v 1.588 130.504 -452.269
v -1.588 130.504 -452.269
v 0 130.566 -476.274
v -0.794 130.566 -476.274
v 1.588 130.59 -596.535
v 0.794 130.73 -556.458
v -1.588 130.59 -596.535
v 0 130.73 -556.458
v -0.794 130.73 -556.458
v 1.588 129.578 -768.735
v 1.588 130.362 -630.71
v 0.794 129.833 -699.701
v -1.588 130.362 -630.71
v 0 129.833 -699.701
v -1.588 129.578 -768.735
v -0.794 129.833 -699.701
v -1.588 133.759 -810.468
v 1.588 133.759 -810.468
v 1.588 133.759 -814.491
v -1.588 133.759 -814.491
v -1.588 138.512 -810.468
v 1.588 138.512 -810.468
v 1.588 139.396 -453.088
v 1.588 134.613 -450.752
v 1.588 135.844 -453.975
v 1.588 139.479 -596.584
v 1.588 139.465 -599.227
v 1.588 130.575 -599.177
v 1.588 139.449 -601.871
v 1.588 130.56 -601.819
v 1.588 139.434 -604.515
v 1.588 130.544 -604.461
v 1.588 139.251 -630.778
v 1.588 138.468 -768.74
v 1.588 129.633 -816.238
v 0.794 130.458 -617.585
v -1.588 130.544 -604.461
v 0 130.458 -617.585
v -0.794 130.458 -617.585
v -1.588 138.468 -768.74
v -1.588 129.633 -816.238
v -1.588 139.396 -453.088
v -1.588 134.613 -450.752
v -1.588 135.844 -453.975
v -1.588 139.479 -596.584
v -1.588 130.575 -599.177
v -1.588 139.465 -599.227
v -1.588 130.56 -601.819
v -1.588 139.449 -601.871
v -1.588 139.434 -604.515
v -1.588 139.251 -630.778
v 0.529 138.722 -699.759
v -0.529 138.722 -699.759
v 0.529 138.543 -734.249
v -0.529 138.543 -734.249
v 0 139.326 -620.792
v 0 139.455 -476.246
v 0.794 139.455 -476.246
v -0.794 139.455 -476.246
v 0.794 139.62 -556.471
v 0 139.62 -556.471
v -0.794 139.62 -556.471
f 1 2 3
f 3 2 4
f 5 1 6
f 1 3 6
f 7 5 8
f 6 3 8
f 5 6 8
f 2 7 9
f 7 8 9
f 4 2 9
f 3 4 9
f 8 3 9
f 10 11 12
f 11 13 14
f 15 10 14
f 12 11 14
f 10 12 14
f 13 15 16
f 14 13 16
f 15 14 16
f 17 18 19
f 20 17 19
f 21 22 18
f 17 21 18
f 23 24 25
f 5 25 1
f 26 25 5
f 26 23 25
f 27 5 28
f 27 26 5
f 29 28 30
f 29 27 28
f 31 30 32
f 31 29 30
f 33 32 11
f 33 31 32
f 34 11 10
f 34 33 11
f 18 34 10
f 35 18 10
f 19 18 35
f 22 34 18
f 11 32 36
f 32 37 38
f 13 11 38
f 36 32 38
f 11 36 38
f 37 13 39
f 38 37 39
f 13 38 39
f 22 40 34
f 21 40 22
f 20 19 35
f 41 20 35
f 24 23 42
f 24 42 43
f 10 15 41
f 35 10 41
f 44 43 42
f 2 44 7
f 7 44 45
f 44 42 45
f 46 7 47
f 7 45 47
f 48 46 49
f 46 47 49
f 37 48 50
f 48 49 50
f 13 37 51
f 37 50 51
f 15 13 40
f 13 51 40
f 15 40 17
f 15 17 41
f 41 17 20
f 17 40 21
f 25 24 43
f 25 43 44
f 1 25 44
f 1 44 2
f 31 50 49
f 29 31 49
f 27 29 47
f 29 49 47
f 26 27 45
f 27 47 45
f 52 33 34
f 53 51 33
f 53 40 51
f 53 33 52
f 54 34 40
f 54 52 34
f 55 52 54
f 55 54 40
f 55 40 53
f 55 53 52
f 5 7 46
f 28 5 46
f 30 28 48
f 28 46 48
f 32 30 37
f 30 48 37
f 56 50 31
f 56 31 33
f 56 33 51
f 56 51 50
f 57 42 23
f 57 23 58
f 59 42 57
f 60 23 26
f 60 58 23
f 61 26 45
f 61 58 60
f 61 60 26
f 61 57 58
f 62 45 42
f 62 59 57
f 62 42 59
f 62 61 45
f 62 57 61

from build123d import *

# Parameters (mm, degrees)
BOSS_EXTRUDE1_START = -1.5875
BOSS_EXTRUDE1_DEPTH = 3.175
FILLET1_R           = 2.54
CUT_EXTRUDE1_DEPTH  = 2674.191025632
FILLET2_R           = 0.762
FILLET3_R           = 0.762
CUT_EXTRUDE2_DEPTH  = 7.62


with BuildPart() as part:
    # Boss-Extrude1: read off the stored shape, not the designer's step
    # Boss-Extrude1 outline → Boss-Extrude1 (new body)
    with BuildSketch(Plane(origin=(0, 0, 0), x_dir=(0, 0, -1), z_dir=(1, 0, 0)).offset(BOSS_EXTRUDE1_START)):
        with BuildLine():
            add(Edge.make_bspline(
                [(1110.404970926, 130.384545774), (1120.170834465, 130.370061323), (1139.703057908, 130.338772026), (1168.998370974, 130.277673039), (1198.290610395, 130.194386876), (1217.81419633, 130.113940836), (1227.576506903, 130.06508052)],
                knots=[0, 0, 0, 0, 0.25, 0.5, 0.75, 1, 1, 1, 1], degree=3))
            add(Edge.make_bspline(
                [(1227.576506903, 130.06508052), (1269.911205773, 129.853195249), (1333.427746701, 129.273373321), (1418.042208161, 127.449050563), (1502.665994832, 124.913583682), (1608.454176987, 120.803299479), (1693.070073331, 116.848243245), (1735.369787733, 114.744712179)],
                knots=[0, 0, 0, 0, 0.25, 0.375, 0.5, 0.75, 1, 1, 1, 1], degree=3))
            add(Edge.make_bspline(
                [(1735.369787733, 114.744712179), (1815.995940723, 110.735232018), (1936.906650462, 104.096364548), (2098.049485168, 94.18797875), (2198.694736725, 87.314638509), (2279.130413747, 81.114418931), (2339.412950304, 76.034076608), (2399.564054334, 70.28270545), (2479.570468264, 61.127378254), (2559.292087872, 49.650907614), (2626.797554585, 38.235484735), (2656.889518578, 32.788503969), (2667.159793662, 30.877771266), (2669.54, 30.432069924)],
                knots=[0, 0, 0, 0, 0.25, 0.375, 0.5, 0.5625, 0.625, 0.6875, 0.75, 0.875, 0.9375, 0.96241067, 0.969928536, 0.969928536, 0.969928536, 0.969928536], degree=3))
            Line((2669.54, 30.432069924), (2669.54, 39.476142465))
            add(Edge.make_bspline(
                [(1735.811334709, 123.623740069), (1776.138635499, 121.618292624), (1816.460281579, 119.500621806), (1897.093668675, 115.087561885), (1937.405638896, 112.792971084), (2018.018419045, 108.018366523), (2058.319512223, 105.539122976), (2138.903780144, 100.307240032), (2179.18739793, 97.555127955), (2239.586998714, 93.080168687), (2259.716280977, 91.529837622), (2289.900442602, 89.09084343), (2299.960179135, 88.258845039), (2320.076004566, 86.552861654), (2330.132100898, 85.678962223), (2350.239356518, 83.874334847), (2360.290489794, 82.943307484), (2380.385973971, 81.003183297), (2390.430065378, 79.993418555), (2420.547026195, 76.827577532), (2440.60648589, 74.533672955), (2480.675569568, 69.556278523), (2500.68715183, 66.874150811), (2540.654290207, 61.150246295), (2560.611026428, 58.109755646), (2600.475457131, 51.702465574), (2620.382967089, 48.337538888), (2650.028116889, 43.072156367), (2659.78844051, 41.29687683), (2669.54, 39.476142465)],
                knots=[0, 0, 0, 0, 0.125, 0.125, 0.25, 0.25, 0.375, 0.375, 0.5, 0.5, 0.5625, 0.5625, 0.59375, 0.59375, 0.625, 0.625, 0.65625, 0.65625, 0.6875, 0.6875, 0.75, 0.75, 0.8125, 0.8125, 0.875, 0.875, 0.9375, 0.9375, 0.968210768, 0.968210768, 0.968210768, 0.968210768], degree=3))
            add(Edge.make_bspline(
                [(1227.621000751, 138.954969175), (1248.807303679, 138.848931677), (1269.993583155, 138.701170252), (1312.363832348, 138.270664618), (1333.547719008, 137.987407832), (1375.912368189, 137.249274813), (1397.09309738, 136.7925677), (1439.451328259, 135.701855835), (1460.629010312, 135.069210584), (1502.979101161, 133.670541385), (1524.152152736, 132.907434339), (1566.494303759, 131.284732459), (1587.663166024, 130.423163385), (1651.164052809, 127.709123983), (1693.490421561, 125.728325331), (1735.811334709, 123.623740069)],
                knots=[0, 0, 0, 0, 0.125, 0.125, 0.25, 0.25, 0.375, 0.375, 0.5, 0.5, 0.625, 0.625, 0.75, 0.75, 1, 1, 1, 1], degree=3))
            add(Edge.make_bspline(
                [(1110.418156307, 139.274535996), (1129.952027249, 139.245563914), (1149.485893504, 139.211997476), (1188.553558893, 139.115899087), (1208.087346834, 139.052735015), (1227.621000751, 138.954969175)],
                knots=[0, 0, 0, 0, 0.5, 0.5, 1, 1, 1, 1], degree=3))
            add(Edge.make_bspline(
                [(768.740124165, 138.468408213), (782.976796045, 138.460280143), (797.213453801, 138.479500079), (825.686695051, 138.549690296), (839.923258916, 138.600062665), (868.396318956, 138.719026333), (882.632808962, 138.789607972), (911.105746117, 138.939594729), (925.342197007, 139.018479563), (953.81517223, 139.160090703), (968.051699178, 139.222241505), (996.524919377, 139.30995407), (1010.761605517, 139.335014039), (1039.234912871, 139.349647552), (1053.471562869, 139.340493535), (1081.944860968, 139.313691902), (1096.181508981, 139.29565137), (1110.418156307, 139.274535996)],
                knots=[0, 0, 0, 0, 0.125, 0.125, 0.25, 0.25, 0.375, 0.375, 0.5, 0.5, 0.625, 0.625, 0.75, 0.75, 0.875, 0.875, 1, 1, 1, 1], degree=3))
            add(Edge.make_bspline(
                [(630.778432202, 139.251437536), (653.771819614, 139.075315664), (676.765000849, 138.871740519), (711.255349111, 138.647690701), (722.752238945, 138.586174182), (745.746099074, 138.499784896), (757.243084259, 138.474972158), (768.740124165, 138.468408213)],
                knots=[0, 0, 0, 0, 0.5, 0.5, 0.75, 0.75, 1, 1, 1, 1], degree=3))
            add(Edge.make_bspline(
                [(604.514984259, 139.433685568), (609.940743136, 139.400696354), (618.695242427, 139.342071397), (627.449694696, 139.276935028), (630.778432202, 139.251437536)],
                knots=[0, 0, 0, 0, 0.619765686, 1, 1, 1, 1], degree=3))
            ThreePointArc((604.514984259, 139.433685568), (600.549356142, 139.457173081), (596.583720644, 139.479379304))
            add(Edge.make_bspline(
                [(436.133018826, 139.357176562), (449.50393779, 139.390650739), (462.874888934, 139.412366015), (489.61665939, 139.498555977), (502.987497127, 139.559076553), (529.729299233, 139.628029754), (543.100240501, 139.639230481), (569.84212102, 139.601013959), (583.212960696, 139.552035302), (596.583720644, 139.479379304)],
                knots=[0, 0, 0, 0, 0.25, 0.25, 0.5, 0.5, 0.75, 0.75, 1, 1, 1, 1], degree=3))
            add(Edge.make_bspline(
                [(432.263917423, 139.347117104), (433.553617637, 139.350567112), (434.843318039, 139.353947814), (436.133018826, 139.357176562)],
                knots=[0, 0, 0, 0, 1, 1, 1, 1], degree=3))
            add(Edge.make_bspline(
                [(420.316232014, 139.305761868), (422.413235913, 139.315186344), (426.395793967, 139.330351666), (430.378363115, 139.342073082), (432.263917423, 139.347117104)],
                knots=[0, 0, 0, 0, 0.526548575, 1, 1, 1, 1], degree=3))
            add(Edge.make_bspline(
                [(376.410119779, 138.75403864), (383.726317086, 138.935561778), (391.043801196, 139.055611797), (405.679602634, 139.224192856), (412.997895507, 139.272871444), (420.316232014, 139.305761868)],
                knots=[0, 0, 0, 0, 0.5, 0.5, 1, 1, 1, 1], degree=3))
            add(Edge.make_bspline(
                [(336.49221538, 137.002990798), (349.782924989, 137.88646357), (363.094318653, 138.423658969), (376.410119779, 138.75403864)],
                knots=[0, 0, 0, 0, 1, 1, 1, 1], degree=3))
            add(Edge.make_bspline(
                [(322.369488076, 135.928469458), (327.073374868, 136.333386449), (331.781331813, 136.689844531), (336.49221538, 137.002990798)],
                knots=[0, 0, 0, 0, 1, 1, 1, 1], degree=3))
            add(Edge.make_bspline(
                [(269.769949315, 129.47895505), (274.123387467, 130.231879276), (278.485668028, 130.925946417), (287.22796256, 132.196043087), (291.608626646, 132.771988738), (300.381777496, 133.818422146), (304.774579419, 134.288963443), (313.567800313, 135.154375086), (317.967903853, 135.549407043), (322.369488076, 135.928469458)],
                knots=[0, 0, 0, 0, 0.25, 0.25, 0.5, 0.5, 0.75, 0.75, 1, 1, 1, 1], degree=3))
            add(Edge.make_bspline(
                [(135.15718457, 90.054634926), (146.043739673, 94.375230064), (156.99891695, 98.504335222), (173.56622243, 104.322560697), (179.110932848, 106.199810145), (190.24859245, 109.819698901), (195.841545849, 111.562316625), (207.065472514, 114.901345648), (212.697969124, 116.49836249), (224.005973618, 119.540534541), (229.683240596, 120.9862349), (246.767187276, 125.077694043), (258.225188059, 127.482295924), (269.769949315, 129.47895505)],
                knots=[0, 0, 0, 0, 0.25, 0.25, 0.375, 0.375, 0.5, 0.5, 0.625, 0.625, 0.75, 0.75, 1, 1, 1, 1], degree=3))
            add(Edge.make_bspline(
                [(107.049744533, 78.466050261), (116.373258882, 82.438606419), (125.737350123, 86.316143859), (135.15718457, 90.054634926)],
                knots=[0, 0, 0, 0, 1, 1, 1, 1], degree=3))
            add(Edge.make_bspline(
                [(99.06, 75.03568963), (99.223542669, 75.106424562), (100.635498802, 75.716852689), (103.297453866, 76.863328103), (105.798503999, 77.932922637), (107.049744533, 78.466050261)],
                knots=[0.484151133, 0.484151133, 0.484151133, 0.484151133, 0.515864471, 0.757931449, 1, 1, 1, 1], degree=3))
            Line((99.06, 75.03568963), (99.06, 65.345043949))
            add(Edge.make_bspline(
                [(99.06, 65.345043949), (99.380370965, 65.484464523), (100.637671455, 66.031176319), (103.17753745, 67.132002814), (106.681577323, 68.64166857), (109.249580285, 69.740028797), (110.534459652, 70.287489229)],
                knots=[0.254738807, 0.254738807, 0.254738807, 0.254738807, 0.317238807, 0.5, 0.75, 1, 1, 1, 1], degree=3))
            add(Edge.make_bspline(
                [(110.534459652, 70.287489229), (112.850658013, 71.274373329), (117.489277519, 73.236837099), (124.456688526, 76.138068453), (131.438476528, 78.994265342), (136.101204469, 80.864754132), (138.436571012, 81.791601309)],
                knots=[0, 0, 0, 0, 0.25, 0.5, 0.75, 1, 1, 1, 1], degree=3))
            add(Edge.make_bspline(
                [(138.436571012, 81.791601309), (143.826897197, 83.930883835), (154.6522834, 88.11877139), (176.408203186, 96.037596764), (203.906835742, 104.998187521), (237.39469787, 114.027149543), (259.934818065, 118.755998441), (271.284977744, 120.719001348)],
                knots=[0, 0, 0, 0, 0.125, 0.25, 0.5, 0.75, 1, 1, 1, 1], degree=3))
            add(Edge.make_bspline(
                [(271.284977744, 120.719001348), (275.558711595, 121.458140765), (284.124297478, 122.821139095), (297.036360548, 124.518896272), (310.018420247, 125.909880891), (318.766623126, 126.695286194), (323.13209925, 127.071239405)],
                knots=[5e-09, 5e-09, 5e-09, 5e-09, 0.2499992, 0.4999984, 0.7499976, 0.999996801, 0.999996801, 0.999996801, 0.999996801], degree=3))
            add(Edge.make_bspline(
                [(323.13209925, 127.071239405), (324.293050056, 127.171175344), (326.615168427, 127.365043892), (330.101568176, 127.638529754), (333.590184216, 127.895089457), (335.917953069, 128.055198639), (337.081858513, 128.132566852)],
                knots=[1.2024e-05, 1.2024e-05, 1.2024e-05, 1.2024e-05, 0.250009018, 0.500006012, 0.750003006, 1, 1, 1, 1], degree=3))
            add(Edge.make_bspline(
                [(337.081858513, 128.132566852), (340.367862287, 128.350997241), (346.939906877, 128.744909116), (356.821319657, 129.221190111), (366.716250393, 129.595096292), (373.326613137, 129.784797569), (376.630622597, 129.866773678)],
                knots=[0, 0, 0, 0, 0.25, 0.5, 0.75, 1, 1, 1, 1], degree=3))
            add(Edge.make_bspline(
                [(376.630622597, 129.866773678), (380.266394474, 129.956981294), (387.534764147, 130.106779908), (398.462206547, 130.259361028), (409.400972015, 130.358727994), (416.705417778, 130.39944419), (420.356185481, 130.415851648)],
                knots=[0, 0, 0, 0, 0.25, 0.5, 0.75, 1, 1, 1, 1], degree=3))
            add(Edge.make_bspline(
                [(420.356185481, 130.415851648), (421.350045129, 130.420318309), (423.337533562, 130.428603137), (426.320174328, 130.439402209), (429.303468332, 130.448883952), (431.293011648, 130.454488038), (432.287698861, 130.457148912)],
                knots=[0, 0, 0, 0, 0.25, 0.5, 0.75, 1, 1, 1, 1], degree=3))
            add(Edge.make_bspline(
                [(432.287698861, 130.457148912), (432.610032304, 130.45801117), (433.254717136, 130.45972707), (434.221637716, 130.462266911), (435.188505114, 130.464765142), (435.833012253, 130.466397641), (436.155274747, 130.46720442)],
                knots=[9.2e-08, 9.2e-08, 9.2e-08, 9.2e-08, 0.25, 0.5, 0.75, 1, 1, 1, 1], degree=3))
            add(Edge.make_bspline(
                [(436.155274747, 130.46720442), (449.528322363, 130.500683927), (476.275740382, 130.546633815), (516.38896029, 130.728798697), (556.456290895, 130.759667498), (583.176533448, 130.662101975), (596.535396133, 130.589510646)],
                knots=[0, 0, 0, 0, 0.249999973, 0.499999946, 0.749999918, 0.999999891, 0.999999891, 0.999999891, 0.999999891], degree=3))
            ThreePointArc((596.535396133, 130.589510646), (600.498158983, 130.567320504), (604.460914457, 130.543849998))
            add(Edge.make_bspline(
                [(604.460914457, 130.543849998), (606.648150431, 130.530551362), (611.022503017, 130.502867011), (617.584689429, 130.458405465), (624.147187284, 130.411339888), (628.522663802, 130.378455494), (630.7103385, 130.361698324)],
                knots=[-7.09e-07, -7.09e-07, -7.09e-07, -7.09e-07, 0.249999468, 0.499999646, 0.749999823, 1, 1, 1, 1], degree=3))
            add(Edge.make_bspline(
                [(630.7103385, 130.361698324), (642.206126489, 130.273644326), (665.193556095, 130.083785311), (699.699077953, 129.819212193), (734.21504011, 129.634735151), (757.228597075, 129.58497898), (768.735048644, 129.578409662)],
                knots=[0, 0, 0, 0, 0.25, 0.5, 0.75, 1, 1, 1, 1], degree=3))
            add(Edge.make_bspline(
                [(768.735048644, 129.578409662), (797.222409768, 129.56214552), (854.203652026, 129.725124503), (939.635195481, 130.236578518), (1024.992958464, 130.524931921), (1081.937612336, 130.426767717), (1110.404970926, 130.384545774)],
                knots=[0, 0, 0, 0, 0.25, 0.5, 0.75, 1, 1, 1, 1], degree=3))
        make_face()
    extrude(amount=BOSS_EXTRUDE1_DEPTH)

    # Fillet1
    fillet1_edges = [part.edges().sort_by_distance(p)[0] for p in [
        (0, 39.476142465, -2669.54),
        (0, 30.432069924, -2669.54),
        (0, 65.345043949, -99.06),
        (0, 75.03568963, -99.06),
    ]]
    fillet(fillet1_edges, radius=FILLET1_R)

    # Sketch4 → Cut-Extrude1 (cut, through all)
    with BuildSketch(Plane(origin=(1.5875, 0, 0), x_dir=(0, 0, -1), z_dir=(1, 0, 0))):
        Polygon((1827.2125, 118.895836595), (1827.2125, 110.000384115), (1827.2125, 78.791710134), (2135.1875, 78.791710134), (2135.1875, 91.599357392), (2135.1875, 100.508307819), (2135.1875, 129.353842083), (1827.2125, 129.353842083), align=None)
    extrude(amount=-CUT_EXTRUDE1_DEPTH, mode=Mode.SUBTRACT)


with BuildPart() as cut_extrude1_piece_1:
    # of the separate pieces the step leaves, piece 1, a body of its own (cut_extrude1_pieces)
    add(part.part.solids().sort_by_distance((-1.5875, 114.744712179, -1735.369787733))[0])

    # Fillet2
    fillet2_edges = [cut_extrude1_piece_1.edges().sort_by_distance(p)[0] for p in [
        (0, 118.895836595, -1827.2125),
        (0, 110.000384116, -1827.2125),
    ]]
    fillet(fillet2_edges, radius=FILLET2_R)


with BuildPart() as cut_extrude1_piece_2:
    # of the separate pieces the step leaves, piece 2, a body of its own (cut_extrude1_pieces)
    add(part.part.solids().sort_by_distance((-1.5875, 91.599357392, -2135.1875))[0])

    # Fillet3
    fillet3_edges = [cut_extrude1_piece_2.edges().sort_by_distance(p)[0] for p in [
        (0, 100.508307819, -2135.1875),
        (0, 91.599357392, -2135.1875),
    ]]
    fillet(fillet3_edges, radius=FILLET3_R)


with BuildPart() as cut_extrude2_tool:
    # Sketch5 → Cut-Extrude2 (new body)
    with BuildSketch(Plane(origin=(1.5875, 0, 0), x_dir=(0, 0, -1), z_dir=(1, 0, 0))):
        Polygon((453.088349995, 139.395824167), (450.752036301, 134.613422753), (453.975418286, 135.844351639), (452.268768997, 130.504363999), (452.268768997, 127.575945218), (73.329869983, 29.953173686), (0, 149.408643021), (453.088349995, 149.408643021), align=None)
        Polygon((810.468029574, 138.512199639), (810.468029574, 133.759282778), (814.491468237, 133.759282778), (816.238424635, 129.632745348), (816.238424635, 125.564439067), (2630.646632523, -161.702489223), (2897.593300558, 152.988782274), (810.468029574, 152.988782274), align=None)
    extrude(amount=-CUT_EXTRUDE2_DEPTH)


with BuildPart() as cut_extrude1_piece_1_1:
    add(cut_extrude1_piece_1.part)

    # Cut-Extrude2: cut by cut_extrude2_tool
    add(cut_extrude2_tool.part, mode=Mode.SUBTRACT)


with BuildPart() as cut_extrude1_piece_2_1:
    add(cut_extrude1_piece_2.part)

    # Cut-Extrude2: cut by cut_extrude2_tool
    add(cut_extrude2_tool.part, mode=Mode.SUBTRACT)


solid = cut_extrude1_piece_1_1.part
